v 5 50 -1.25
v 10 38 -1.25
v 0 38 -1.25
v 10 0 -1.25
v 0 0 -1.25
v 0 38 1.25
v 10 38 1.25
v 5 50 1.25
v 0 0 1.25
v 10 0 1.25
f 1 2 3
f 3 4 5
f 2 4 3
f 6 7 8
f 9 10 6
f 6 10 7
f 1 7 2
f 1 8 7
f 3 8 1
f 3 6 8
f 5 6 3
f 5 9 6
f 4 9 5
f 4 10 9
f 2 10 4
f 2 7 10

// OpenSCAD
//Fences motherfucker

FencePostWidth = 10;
FencePostTaperHeight = 12;
FencePostHeight = 50;
FencePostThickness = 2.5;

FencePostSpaceing = 5;



module fencePost(x,y,z, thickness){
	linear_extrude(height = thickness, center = true, convexity = 10, twist = 0)
	polygon(points = [[0,0], [x,0], [x,z-y], [x/2,z], [0,z-y]], paths = [[0,1,2,3,4]]);
}

module fenceLine(spacing, length){
	
}

fencePost(FencePostWidth, FencePostTaperHeight, FencePostHeight, FencePostThickness);
